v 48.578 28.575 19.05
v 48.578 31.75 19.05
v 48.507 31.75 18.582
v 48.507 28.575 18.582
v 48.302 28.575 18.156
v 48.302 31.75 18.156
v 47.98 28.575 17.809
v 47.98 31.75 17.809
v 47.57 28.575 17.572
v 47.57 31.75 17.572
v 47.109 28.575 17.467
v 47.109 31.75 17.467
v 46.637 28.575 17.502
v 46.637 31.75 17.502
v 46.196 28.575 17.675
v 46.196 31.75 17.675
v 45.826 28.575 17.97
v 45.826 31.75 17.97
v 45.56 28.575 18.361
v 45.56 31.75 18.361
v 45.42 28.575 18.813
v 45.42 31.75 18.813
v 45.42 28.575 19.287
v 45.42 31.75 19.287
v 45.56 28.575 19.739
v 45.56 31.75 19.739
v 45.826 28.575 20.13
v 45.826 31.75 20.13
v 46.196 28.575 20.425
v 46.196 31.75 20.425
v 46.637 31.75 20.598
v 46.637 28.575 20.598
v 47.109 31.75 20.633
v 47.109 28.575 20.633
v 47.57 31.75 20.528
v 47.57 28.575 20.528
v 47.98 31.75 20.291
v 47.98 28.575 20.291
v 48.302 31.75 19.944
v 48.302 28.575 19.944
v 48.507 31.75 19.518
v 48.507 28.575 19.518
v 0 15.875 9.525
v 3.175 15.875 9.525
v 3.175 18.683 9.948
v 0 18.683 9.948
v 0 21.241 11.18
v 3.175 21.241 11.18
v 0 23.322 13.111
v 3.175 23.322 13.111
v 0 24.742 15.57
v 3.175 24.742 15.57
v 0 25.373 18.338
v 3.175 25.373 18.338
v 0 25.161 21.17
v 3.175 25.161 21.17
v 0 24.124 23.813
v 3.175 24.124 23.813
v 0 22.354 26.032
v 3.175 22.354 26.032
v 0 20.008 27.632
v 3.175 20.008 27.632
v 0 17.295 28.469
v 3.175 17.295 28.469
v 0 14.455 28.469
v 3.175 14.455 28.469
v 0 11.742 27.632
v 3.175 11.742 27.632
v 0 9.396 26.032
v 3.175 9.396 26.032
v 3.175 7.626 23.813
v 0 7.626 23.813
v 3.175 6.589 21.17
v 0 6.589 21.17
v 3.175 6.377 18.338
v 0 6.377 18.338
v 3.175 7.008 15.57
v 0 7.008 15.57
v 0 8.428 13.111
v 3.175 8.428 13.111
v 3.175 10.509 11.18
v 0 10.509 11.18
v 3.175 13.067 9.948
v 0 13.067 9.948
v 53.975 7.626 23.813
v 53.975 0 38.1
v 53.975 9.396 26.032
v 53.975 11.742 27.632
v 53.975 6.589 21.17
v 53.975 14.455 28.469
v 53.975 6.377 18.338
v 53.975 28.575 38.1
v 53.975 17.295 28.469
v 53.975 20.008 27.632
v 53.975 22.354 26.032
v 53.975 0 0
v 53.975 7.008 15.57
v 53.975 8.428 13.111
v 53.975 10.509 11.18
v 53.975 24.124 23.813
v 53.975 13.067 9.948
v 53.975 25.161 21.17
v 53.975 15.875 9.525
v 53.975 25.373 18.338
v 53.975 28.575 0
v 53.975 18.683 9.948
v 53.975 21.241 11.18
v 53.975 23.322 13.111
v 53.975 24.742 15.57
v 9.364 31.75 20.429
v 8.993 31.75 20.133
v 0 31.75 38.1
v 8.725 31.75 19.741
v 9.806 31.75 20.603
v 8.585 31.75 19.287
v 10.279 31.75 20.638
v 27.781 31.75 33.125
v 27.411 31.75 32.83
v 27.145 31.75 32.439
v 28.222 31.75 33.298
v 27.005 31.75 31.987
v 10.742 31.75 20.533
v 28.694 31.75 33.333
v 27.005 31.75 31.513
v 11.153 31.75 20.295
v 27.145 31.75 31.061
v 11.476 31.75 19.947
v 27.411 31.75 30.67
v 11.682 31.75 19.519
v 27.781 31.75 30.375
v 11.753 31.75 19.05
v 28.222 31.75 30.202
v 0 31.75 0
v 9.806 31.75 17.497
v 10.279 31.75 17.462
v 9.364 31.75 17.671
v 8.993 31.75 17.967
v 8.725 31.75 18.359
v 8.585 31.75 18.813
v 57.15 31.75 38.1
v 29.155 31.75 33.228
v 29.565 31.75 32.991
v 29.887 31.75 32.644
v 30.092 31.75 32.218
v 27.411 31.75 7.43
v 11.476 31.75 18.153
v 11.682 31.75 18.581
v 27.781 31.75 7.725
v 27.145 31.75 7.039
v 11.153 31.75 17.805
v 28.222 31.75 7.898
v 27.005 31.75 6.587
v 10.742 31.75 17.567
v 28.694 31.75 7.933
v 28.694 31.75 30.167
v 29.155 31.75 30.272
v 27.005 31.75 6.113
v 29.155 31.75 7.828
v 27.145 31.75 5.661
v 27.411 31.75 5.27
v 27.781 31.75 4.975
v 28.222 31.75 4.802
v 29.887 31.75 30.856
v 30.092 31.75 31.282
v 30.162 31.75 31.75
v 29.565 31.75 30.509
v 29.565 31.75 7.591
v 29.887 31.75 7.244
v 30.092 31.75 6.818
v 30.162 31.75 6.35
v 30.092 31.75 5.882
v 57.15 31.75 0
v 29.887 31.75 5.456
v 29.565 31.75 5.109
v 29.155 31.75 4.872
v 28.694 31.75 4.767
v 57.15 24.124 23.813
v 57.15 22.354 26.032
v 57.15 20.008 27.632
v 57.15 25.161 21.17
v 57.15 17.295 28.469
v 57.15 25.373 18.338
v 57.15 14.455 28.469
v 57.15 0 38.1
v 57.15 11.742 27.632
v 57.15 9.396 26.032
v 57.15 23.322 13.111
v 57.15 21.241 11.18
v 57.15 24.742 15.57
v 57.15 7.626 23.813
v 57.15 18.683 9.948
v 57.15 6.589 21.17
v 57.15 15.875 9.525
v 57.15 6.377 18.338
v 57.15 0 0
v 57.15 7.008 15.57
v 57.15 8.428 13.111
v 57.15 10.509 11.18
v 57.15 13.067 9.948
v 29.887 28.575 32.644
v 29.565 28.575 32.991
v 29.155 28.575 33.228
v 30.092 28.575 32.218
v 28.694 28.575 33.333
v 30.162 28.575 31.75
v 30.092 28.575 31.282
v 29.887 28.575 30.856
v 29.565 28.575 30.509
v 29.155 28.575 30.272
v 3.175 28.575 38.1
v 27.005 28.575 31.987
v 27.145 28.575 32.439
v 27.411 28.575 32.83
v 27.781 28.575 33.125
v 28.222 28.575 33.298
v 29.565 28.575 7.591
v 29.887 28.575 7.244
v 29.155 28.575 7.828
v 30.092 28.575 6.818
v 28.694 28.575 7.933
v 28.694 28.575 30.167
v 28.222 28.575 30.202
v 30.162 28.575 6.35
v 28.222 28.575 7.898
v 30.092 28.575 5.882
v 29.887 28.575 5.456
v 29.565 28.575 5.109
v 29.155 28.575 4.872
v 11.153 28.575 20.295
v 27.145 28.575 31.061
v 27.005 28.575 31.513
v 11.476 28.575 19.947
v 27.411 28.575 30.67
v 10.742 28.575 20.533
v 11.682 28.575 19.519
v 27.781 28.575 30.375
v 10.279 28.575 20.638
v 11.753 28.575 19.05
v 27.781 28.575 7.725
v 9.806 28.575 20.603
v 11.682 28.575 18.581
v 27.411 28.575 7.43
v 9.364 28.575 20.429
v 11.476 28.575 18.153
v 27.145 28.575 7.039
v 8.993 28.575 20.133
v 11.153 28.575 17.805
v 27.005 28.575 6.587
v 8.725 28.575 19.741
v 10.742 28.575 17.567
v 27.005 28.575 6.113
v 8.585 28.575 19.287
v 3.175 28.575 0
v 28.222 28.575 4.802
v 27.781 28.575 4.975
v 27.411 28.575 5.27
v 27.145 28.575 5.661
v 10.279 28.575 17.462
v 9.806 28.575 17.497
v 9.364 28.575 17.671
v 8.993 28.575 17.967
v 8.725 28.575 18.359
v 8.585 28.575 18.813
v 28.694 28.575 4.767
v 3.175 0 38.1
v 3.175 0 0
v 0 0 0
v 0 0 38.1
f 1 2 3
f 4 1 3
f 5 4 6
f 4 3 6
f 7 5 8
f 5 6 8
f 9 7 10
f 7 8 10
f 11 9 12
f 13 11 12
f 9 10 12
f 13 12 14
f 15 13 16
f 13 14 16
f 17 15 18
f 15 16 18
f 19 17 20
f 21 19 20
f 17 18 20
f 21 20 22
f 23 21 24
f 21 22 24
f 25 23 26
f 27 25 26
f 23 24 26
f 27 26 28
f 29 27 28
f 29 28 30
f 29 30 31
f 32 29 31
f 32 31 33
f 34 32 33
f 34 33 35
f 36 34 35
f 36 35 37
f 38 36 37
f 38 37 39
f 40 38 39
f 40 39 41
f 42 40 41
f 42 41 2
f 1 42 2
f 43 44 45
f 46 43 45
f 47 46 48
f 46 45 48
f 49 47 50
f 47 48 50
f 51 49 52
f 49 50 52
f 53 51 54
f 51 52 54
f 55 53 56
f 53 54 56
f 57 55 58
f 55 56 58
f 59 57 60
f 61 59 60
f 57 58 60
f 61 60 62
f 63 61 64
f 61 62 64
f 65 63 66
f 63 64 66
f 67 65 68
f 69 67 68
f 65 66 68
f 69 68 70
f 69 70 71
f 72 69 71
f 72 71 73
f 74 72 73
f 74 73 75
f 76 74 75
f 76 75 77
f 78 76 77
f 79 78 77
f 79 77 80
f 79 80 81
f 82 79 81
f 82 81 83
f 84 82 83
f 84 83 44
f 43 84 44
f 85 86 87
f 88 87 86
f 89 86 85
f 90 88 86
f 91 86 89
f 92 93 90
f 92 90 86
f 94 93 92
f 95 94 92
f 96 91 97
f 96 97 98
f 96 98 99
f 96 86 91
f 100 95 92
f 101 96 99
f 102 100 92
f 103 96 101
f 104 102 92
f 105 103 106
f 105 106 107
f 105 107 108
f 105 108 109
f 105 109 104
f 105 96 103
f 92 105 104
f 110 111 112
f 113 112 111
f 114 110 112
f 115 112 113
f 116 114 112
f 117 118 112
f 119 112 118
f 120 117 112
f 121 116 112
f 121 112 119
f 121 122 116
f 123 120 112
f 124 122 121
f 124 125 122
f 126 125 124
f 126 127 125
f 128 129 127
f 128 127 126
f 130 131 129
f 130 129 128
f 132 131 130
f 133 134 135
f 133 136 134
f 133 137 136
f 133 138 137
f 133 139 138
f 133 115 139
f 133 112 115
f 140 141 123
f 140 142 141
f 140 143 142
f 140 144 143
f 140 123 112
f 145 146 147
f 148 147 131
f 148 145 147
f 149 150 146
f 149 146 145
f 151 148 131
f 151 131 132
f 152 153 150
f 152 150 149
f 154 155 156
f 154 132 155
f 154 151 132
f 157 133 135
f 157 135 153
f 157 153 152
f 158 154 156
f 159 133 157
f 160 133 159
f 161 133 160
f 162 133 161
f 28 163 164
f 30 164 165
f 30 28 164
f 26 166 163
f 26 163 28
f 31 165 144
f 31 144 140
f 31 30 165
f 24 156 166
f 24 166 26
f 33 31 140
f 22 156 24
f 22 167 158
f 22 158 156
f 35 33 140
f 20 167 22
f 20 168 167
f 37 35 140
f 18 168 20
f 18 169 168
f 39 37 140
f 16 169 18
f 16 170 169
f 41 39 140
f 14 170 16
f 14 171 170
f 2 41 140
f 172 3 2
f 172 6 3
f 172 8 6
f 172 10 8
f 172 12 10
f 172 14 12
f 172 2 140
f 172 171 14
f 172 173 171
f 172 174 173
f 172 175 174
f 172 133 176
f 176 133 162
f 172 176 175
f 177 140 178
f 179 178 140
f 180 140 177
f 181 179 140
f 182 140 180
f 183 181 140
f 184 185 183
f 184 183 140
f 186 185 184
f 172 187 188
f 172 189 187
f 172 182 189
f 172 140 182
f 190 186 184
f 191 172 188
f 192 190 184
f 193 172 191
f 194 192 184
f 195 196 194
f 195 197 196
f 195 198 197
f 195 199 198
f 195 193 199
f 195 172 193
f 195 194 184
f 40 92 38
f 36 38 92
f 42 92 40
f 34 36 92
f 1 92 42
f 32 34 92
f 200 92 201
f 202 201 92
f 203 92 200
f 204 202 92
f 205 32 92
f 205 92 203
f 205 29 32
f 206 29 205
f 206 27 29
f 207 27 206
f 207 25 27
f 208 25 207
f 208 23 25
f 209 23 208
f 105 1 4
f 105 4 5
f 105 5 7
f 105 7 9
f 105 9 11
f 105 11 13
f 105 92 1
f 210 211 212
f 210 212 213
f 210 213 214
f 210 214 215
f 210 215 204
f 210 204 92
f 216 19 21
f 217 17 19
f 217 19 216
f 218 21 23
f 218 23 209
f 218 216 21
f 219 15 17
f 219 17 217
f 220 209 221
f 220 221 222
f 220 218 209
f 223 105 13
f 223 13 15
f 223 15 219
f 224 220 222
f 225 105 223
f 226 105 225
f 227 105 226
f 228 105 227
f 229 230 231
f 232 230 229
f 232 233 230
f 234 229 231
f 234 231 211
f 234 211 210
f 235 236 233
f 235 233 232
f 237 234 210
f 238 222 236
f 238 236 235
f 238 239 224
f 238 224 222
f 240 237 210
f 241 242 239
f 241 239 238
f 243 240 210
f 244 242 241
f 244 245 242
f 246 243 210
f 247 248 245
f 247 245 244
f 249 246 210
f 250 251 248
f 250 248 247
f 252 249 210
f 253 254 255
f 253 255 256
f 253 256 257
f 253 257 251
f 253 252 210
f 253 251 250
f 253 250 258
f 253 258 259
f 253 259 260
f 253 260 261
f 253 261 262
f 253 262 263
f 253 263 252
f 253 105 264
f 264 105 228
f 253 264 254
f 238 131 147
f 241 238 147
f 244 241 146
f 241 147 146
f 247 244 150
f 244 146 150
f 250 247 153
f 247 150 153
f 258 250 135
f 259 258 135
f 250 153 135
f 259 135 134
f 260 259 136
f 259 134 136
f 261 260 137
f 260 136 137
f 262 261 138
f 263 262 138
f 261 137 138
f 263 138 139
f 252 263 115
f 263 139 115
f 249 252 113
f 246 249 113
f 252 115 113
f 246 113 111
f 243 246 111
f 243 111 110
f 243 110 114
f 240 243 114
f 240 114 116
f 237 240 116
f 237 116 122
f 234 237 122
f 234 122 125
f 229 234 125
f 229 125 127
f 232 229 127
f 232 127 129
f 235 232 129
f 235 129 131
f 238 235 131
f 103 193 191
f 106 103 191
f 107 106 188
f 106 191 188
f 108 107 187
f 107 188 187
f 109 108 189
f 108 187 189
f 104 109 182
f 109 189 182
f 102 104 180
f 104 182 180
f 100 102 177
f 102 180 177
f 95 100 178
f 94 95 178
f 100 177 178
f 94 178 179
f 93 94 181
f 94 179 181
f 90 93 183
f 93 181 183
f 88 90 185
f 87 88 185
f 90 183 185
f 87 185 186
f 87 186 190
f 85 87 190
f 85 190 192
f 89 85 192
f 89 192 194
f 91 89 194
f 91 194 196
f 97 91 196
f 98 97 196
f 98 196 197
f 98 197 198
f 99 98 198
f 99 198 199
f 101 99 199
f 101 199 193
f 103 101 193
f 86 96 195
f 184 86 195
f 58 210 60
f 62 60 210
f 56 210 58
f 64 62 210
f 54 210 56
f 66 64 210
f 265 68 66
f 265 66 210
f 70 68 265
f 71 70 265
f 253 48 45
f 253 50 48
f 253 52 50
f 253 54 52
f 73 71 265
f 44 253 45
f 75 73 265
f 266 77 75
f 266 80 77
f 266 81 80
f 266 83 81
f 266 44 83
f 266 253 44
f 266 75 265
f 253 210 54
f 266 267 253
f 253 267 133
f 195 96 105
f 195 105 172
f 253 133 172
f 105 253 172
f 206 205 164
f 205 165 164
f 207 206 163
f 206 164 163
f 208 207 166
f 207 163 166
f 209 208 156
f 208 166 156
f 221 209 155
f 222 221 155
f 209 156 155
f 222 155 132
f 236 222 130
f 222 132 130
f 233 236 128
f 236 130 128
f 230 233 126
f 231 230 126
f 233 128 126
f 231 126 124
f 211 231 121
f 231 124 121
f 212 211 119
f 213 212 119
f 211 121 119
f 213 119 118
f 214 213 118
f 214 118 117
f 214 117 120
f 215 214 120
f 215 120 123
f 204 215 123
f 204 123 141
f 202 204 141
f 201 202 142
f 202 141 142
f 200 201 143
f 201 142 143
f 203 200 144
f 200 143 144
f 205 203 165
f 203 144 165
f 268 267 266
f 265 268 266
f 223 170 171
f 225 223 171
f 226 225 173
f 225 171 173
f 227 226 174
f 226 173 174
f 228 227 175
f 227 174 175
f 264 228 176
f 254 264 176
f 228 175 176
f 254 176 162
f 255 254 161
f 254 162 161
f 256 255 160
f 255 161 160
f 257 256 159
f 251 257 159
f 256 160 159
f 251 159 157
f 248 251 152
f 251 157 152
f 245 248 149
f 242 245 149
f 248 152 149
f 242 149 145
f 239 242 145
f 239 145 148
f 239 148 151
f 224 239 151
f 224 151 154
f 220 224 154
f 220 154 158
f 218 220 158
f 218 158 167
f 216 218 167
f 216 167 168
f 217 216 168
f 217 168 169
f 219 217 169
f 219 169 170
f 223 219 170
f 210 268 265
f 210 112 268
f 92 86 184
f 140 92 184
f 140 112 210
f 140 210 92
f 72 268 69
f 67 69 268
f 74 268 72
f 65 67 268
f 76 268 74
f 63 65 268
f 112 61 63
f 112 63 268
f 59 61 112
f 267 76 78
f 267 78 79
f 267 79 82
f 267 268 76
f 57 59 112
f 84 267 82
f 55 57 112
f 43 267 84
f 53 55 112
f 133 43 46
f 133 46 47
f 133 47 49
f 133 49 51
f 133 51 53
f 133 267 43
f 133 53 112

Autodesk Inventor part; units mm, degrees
ref_plane "YZ Plane" through (0, 0, 0) normal (1, 0, 0) x (0, 1, 0)
ref_plane "XZ Plane" through (0, 0, 0) normal (0, 1, 0) x (-1, 0, 0)
ref_plane "XY Plane" through (0, 0, 0) normal (0, 0, 1) x (1, 0, 0)
sketch "Sketch1" plane through (0, 0, 0) normal (0, 0, 1) x (1, 0, 0)
  line L0 (0, 0) -> (0, 31.75)
  line L1 (0, 31.75) -> (57.15, 31.75)
  line L2 (57.15, 31.75) -> (57.15, 0)
  line L3 (53.975, 0) -> (53.975, 28.575)
  line L4 (53.975, 28.575) -> (3.175, 28.575)
  line L5 (3.175, 28.575) -> (3.175, 0)
  line L6 (0, 0) -> (3.175, 0)
  line L7 (53.975, 0) -> (57.15, 0)
  dimension "d0" = 31.75
  dimension "d1" = 31.75
  dimension "d2" = 57.15
  dimension "d3" = 3.175
extrude "Extrusion1" add sketch "Sketch1" along normal blind 38.1
sketch "Sketch2" plane through (57.15, 0, 0) normal (1, 0, 0) x (0, 0, -1)
  circle A0 centre (-19.05, 15.875) radius 9.525
  dimension "d6" = 19.05
extrude "Extrusion2" cut sketch "Sketch2" against normal blind 38.1
sketch "Sketch3" plane through (0, 0, 0) normal (-1, 0, 0) x (0, 0, 1)
  circle A0 centre (19.05, 15.875) radius 1.5875
  dimension "d10" = 3.175
extrude "Extrusion3" cut sketch "Sketch3" against normal blind 38.1
sketch "Sketch4" plane through (0, 31.75, 0) normal (0, 1, 0) x (1, 0, 0)
  line L0 (0, 0) -> (57.15, 0) projected
  line L1 (0, 0) -> (0, -38.1) projected
  line L2 (57.15, -38.1) -> (0, -38.1) projected
  line L3 (57.15, 0) -> (57.15, -38.1) projected
  circle A0 centre (10.16, -19.05) radius 1.5926
  circle A1 centre (46.99, -19.05) radius 1.5875
  circle A2 centre (28.575, -31.75) radius 1.5875
  circle A3 centre (28.575, -6.35) radius 1.5875
  dimension "d14" = 10.16
  dimension "d15" = 10.16
  dimension "d16" = 19.05
  dimension "d17" = 19.05
  dimension "d18" = 3.1852
  dimension "d19" = 3.175
  dimension "d20" = 3.175
  dimension "d21" = 6.35
  dimension "d22" = 6.35
  dimension "d23" = 3.175
extrude "Extrusion4" cut sketch "Sketch4" against normal blind 38.1 contours A0 | A1 | A2 | A3
sketch "Sketch5" plane through (57.15, 0, 0) normal (1, 0, 0) x (0, 0, -1)
  circle A0 centre (-19.05, 15.875) radius 9.525 projected
extrude "Extrusion5" cut sketch "Sketch5" against normal blind 127
properties part number "Mount" material "Aluminum 6061"
